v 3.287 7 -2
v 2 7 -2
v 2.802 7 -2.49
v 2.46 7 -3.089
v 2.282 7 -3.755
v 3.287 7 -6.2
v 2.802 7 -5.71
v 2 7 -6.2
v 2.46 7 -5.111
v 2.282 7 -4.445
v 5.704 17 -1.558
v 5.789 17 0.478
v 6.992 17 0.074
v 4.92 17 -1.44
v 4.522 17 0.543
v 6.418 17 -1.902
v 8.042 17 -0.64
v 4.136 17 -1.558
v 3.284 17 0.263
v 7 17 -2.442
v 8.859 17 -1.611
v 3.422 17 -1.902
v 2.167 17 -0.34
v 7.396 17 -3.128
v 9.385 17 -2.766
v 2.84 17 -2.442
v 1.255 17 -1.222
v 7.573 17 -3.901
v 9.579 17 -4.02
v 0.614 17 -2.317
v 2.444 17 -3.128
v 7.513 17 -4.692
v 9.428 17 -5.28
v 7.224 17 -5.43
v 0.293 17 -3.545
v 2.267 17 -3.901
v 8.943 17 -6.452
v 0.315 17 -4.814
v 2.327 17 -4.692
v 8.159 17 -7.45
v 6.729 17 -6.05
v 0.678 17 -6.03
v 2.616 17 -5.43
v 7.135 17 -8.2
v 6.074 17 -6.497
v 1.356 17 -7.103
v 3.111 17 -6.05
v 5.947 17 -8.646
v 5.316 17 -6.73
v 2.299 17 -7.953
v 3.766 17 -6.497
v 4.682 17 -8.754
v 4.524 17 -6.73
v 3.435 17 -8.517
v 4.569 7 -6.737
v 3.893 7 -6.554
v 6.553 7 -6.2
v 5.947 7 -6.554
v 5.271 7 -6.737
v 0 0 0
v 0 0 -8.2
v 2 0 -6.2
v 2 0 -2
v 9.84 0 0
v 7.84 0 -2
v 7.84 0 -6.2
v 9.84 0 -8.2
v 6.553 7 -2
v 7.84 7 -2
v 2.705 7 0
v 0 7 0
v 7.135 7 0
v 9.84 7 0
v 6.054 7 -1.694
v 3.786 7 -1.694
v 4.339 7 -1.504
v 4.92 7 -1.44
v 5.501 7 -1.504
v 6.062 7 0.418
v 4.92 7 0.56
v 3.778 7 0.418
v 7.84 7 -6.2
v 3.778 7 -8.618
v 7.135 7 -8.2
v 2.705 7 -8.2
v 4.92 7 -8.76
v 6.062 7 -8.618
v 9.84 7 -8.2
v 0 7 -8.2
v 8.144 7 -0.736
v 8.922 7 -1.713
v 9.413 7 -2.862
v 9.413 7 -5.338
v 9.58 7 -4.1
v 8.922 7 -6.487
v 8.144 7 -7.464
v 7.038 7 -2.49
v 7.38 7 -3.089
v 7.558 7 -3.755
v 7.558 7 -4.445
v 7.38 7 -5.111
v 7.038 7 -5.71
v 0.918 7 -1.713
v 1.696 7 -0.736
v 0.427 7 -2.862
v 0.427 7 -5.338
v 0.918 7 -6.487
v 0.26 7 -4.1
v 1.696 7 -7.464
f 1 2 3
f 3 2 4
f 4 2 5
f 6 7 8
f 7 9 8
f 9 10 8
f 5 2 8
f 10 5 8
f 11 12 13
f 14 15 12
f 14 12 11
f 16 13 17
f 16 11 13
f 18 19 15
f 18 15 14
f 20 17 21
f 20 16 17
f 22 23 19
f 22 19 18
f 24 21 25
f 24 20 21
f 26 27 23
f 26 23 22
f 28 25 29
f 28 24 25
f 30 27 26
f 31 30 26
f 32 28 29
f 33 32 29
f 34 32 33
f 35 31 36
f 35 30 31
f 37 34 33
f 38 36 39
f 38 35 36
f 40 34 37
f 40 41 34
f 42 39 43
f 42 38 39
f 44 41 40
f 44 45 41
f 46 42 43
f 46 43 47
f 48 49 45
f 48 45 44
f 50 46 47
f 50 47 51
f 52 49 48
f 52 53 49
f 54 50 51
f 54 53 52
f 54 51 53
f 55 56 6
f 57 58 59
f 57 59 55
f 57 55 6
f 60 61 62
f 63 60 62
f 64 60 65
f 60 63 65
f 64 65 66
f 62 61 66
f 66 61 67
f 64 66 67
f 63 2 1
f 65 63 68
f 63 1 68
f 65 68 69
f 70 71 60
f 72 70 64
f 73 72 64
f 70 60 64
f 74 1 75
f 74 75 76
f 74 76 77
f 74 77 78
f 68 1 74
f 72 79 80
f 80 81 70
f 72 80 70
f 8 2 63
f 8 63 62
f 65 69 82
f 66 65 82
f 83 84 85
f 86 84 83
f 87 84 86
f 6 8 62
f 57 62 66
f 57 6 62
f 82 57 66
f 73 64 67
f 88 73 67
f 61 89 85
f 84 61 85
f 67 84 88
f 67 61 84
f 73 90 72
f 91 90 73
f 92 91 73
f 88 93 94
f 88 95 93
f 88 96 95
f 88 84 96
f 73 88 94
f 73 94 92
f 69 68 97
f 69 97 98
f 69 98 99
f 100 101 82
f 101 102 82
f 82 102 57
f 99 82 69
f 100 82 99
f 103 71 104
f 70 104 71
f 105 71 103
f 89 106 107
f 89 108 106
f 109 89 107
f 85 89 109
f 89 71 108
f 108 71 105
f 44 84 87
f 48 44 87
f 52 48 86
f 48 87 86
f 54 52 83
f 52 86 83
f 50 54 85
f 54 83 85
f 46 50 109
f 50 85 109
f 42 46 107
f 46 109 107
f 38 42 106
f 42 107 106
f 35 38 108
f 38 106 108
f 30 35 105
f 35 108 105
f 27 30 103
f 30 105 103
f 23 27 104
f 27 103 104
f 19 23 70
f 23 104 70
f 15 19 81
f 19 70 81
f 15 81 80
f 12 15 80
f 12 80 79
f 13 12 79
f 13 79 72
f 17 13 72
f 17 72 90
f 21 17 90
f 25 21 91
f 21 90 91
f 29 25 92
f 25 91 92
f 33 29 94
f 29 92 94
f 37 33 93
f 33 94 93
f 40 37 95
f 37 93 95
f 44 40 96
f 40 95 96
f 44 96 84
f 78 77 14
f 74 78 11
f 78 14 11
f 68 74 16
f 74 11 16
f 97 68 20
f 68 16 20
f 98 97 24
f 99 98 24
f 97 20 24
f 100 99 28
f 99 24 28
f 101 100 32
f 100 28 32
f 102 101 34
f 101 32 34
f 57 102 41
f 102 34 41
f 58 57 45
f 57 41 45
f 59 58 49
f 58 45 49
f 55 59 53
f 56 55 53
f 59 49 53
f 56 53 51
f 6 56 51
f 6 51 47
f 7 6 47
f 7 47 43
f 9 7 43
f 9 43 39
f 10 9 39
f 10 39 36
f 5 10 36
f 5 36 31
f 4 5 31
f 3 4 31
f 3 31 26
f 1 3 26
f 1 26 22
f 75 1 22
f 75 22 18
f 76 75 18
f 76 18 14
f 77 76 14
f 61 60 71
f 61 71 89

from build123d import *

# Parameters (mm, degrees)
SKETCH2_W           = 9.84
SKETCH2_H           = 8.2
BOSS_EXTRUDE1_DEPTH = 7
SKETCH3_W           = 5.84
SKETCH3_H           = 4.2
CUT_EXTRUDE1_DEPTH  = 15.596766765
SKETCH4_R           = 4.66
BOSS_EXTRUDE2_DEPTH = 10
SKETCH5_R           = 2.66
CUT_EXTRUDE2_DEPTH  = 10


with BuildPart() as part:
    # Sketch2 → Boss-Extrude1 (new body)
    with BuildSketch(Plane(origin=(0, 0, 0), x_dir=(1, 0, 0), z_dir=(0, 1, 0))):
        with Locations((4.92, 4.1)):
            Rectangle(SKETCH2_W, SKETCH2_H)
    extrude(amount=BOSS_EXTRUDE1_DEPTH)

    # Sketch3 → Cut-Extrude1 (cut, through all)
    with BuildSketch(Plane(origin=(0, 7, 0), x_dir=(1, 0, 0), z_dir=(0, 1, 0))):
        with Locations((4.92, 4.1)):
            Rectangle(SKETCH3_W, SKETCH3_H)
    extrude(amount=-CUT_EXTRUDE1_DEPTH, mode=Mode.SUBTRACT)

    # Sketch4 → Boss-Extrude2 (add)
    with BuildSketch(Plane(origin=(0, 7, 0), x_dir=(1, 0, 0), z_dir=(0, 1, 0))):
        with Locations(Location((4.92, 4.1, 0), (0, 0, 61.621661447))):
            Circle(SKETCH4_R)
    extrude(amount=BOSS_EXTRUDE2_DEPTH)

    # Sketch5 → Cut-Extrude2 (cut)
    with BuildSketch(Plane(origin=(0, 17, 0), x_dir=(1, 0, 0), z_dir=(0, 1, 0))):
        with Locations(Location((4.92, 4.1, 0), (0, 0, 270))):
            Circle(SKETCH5_R)
    extrude(amount=-CUT_EXTRUDE2_DEPTH, mode=Mode.SUBTRACT)


solid = part.part
